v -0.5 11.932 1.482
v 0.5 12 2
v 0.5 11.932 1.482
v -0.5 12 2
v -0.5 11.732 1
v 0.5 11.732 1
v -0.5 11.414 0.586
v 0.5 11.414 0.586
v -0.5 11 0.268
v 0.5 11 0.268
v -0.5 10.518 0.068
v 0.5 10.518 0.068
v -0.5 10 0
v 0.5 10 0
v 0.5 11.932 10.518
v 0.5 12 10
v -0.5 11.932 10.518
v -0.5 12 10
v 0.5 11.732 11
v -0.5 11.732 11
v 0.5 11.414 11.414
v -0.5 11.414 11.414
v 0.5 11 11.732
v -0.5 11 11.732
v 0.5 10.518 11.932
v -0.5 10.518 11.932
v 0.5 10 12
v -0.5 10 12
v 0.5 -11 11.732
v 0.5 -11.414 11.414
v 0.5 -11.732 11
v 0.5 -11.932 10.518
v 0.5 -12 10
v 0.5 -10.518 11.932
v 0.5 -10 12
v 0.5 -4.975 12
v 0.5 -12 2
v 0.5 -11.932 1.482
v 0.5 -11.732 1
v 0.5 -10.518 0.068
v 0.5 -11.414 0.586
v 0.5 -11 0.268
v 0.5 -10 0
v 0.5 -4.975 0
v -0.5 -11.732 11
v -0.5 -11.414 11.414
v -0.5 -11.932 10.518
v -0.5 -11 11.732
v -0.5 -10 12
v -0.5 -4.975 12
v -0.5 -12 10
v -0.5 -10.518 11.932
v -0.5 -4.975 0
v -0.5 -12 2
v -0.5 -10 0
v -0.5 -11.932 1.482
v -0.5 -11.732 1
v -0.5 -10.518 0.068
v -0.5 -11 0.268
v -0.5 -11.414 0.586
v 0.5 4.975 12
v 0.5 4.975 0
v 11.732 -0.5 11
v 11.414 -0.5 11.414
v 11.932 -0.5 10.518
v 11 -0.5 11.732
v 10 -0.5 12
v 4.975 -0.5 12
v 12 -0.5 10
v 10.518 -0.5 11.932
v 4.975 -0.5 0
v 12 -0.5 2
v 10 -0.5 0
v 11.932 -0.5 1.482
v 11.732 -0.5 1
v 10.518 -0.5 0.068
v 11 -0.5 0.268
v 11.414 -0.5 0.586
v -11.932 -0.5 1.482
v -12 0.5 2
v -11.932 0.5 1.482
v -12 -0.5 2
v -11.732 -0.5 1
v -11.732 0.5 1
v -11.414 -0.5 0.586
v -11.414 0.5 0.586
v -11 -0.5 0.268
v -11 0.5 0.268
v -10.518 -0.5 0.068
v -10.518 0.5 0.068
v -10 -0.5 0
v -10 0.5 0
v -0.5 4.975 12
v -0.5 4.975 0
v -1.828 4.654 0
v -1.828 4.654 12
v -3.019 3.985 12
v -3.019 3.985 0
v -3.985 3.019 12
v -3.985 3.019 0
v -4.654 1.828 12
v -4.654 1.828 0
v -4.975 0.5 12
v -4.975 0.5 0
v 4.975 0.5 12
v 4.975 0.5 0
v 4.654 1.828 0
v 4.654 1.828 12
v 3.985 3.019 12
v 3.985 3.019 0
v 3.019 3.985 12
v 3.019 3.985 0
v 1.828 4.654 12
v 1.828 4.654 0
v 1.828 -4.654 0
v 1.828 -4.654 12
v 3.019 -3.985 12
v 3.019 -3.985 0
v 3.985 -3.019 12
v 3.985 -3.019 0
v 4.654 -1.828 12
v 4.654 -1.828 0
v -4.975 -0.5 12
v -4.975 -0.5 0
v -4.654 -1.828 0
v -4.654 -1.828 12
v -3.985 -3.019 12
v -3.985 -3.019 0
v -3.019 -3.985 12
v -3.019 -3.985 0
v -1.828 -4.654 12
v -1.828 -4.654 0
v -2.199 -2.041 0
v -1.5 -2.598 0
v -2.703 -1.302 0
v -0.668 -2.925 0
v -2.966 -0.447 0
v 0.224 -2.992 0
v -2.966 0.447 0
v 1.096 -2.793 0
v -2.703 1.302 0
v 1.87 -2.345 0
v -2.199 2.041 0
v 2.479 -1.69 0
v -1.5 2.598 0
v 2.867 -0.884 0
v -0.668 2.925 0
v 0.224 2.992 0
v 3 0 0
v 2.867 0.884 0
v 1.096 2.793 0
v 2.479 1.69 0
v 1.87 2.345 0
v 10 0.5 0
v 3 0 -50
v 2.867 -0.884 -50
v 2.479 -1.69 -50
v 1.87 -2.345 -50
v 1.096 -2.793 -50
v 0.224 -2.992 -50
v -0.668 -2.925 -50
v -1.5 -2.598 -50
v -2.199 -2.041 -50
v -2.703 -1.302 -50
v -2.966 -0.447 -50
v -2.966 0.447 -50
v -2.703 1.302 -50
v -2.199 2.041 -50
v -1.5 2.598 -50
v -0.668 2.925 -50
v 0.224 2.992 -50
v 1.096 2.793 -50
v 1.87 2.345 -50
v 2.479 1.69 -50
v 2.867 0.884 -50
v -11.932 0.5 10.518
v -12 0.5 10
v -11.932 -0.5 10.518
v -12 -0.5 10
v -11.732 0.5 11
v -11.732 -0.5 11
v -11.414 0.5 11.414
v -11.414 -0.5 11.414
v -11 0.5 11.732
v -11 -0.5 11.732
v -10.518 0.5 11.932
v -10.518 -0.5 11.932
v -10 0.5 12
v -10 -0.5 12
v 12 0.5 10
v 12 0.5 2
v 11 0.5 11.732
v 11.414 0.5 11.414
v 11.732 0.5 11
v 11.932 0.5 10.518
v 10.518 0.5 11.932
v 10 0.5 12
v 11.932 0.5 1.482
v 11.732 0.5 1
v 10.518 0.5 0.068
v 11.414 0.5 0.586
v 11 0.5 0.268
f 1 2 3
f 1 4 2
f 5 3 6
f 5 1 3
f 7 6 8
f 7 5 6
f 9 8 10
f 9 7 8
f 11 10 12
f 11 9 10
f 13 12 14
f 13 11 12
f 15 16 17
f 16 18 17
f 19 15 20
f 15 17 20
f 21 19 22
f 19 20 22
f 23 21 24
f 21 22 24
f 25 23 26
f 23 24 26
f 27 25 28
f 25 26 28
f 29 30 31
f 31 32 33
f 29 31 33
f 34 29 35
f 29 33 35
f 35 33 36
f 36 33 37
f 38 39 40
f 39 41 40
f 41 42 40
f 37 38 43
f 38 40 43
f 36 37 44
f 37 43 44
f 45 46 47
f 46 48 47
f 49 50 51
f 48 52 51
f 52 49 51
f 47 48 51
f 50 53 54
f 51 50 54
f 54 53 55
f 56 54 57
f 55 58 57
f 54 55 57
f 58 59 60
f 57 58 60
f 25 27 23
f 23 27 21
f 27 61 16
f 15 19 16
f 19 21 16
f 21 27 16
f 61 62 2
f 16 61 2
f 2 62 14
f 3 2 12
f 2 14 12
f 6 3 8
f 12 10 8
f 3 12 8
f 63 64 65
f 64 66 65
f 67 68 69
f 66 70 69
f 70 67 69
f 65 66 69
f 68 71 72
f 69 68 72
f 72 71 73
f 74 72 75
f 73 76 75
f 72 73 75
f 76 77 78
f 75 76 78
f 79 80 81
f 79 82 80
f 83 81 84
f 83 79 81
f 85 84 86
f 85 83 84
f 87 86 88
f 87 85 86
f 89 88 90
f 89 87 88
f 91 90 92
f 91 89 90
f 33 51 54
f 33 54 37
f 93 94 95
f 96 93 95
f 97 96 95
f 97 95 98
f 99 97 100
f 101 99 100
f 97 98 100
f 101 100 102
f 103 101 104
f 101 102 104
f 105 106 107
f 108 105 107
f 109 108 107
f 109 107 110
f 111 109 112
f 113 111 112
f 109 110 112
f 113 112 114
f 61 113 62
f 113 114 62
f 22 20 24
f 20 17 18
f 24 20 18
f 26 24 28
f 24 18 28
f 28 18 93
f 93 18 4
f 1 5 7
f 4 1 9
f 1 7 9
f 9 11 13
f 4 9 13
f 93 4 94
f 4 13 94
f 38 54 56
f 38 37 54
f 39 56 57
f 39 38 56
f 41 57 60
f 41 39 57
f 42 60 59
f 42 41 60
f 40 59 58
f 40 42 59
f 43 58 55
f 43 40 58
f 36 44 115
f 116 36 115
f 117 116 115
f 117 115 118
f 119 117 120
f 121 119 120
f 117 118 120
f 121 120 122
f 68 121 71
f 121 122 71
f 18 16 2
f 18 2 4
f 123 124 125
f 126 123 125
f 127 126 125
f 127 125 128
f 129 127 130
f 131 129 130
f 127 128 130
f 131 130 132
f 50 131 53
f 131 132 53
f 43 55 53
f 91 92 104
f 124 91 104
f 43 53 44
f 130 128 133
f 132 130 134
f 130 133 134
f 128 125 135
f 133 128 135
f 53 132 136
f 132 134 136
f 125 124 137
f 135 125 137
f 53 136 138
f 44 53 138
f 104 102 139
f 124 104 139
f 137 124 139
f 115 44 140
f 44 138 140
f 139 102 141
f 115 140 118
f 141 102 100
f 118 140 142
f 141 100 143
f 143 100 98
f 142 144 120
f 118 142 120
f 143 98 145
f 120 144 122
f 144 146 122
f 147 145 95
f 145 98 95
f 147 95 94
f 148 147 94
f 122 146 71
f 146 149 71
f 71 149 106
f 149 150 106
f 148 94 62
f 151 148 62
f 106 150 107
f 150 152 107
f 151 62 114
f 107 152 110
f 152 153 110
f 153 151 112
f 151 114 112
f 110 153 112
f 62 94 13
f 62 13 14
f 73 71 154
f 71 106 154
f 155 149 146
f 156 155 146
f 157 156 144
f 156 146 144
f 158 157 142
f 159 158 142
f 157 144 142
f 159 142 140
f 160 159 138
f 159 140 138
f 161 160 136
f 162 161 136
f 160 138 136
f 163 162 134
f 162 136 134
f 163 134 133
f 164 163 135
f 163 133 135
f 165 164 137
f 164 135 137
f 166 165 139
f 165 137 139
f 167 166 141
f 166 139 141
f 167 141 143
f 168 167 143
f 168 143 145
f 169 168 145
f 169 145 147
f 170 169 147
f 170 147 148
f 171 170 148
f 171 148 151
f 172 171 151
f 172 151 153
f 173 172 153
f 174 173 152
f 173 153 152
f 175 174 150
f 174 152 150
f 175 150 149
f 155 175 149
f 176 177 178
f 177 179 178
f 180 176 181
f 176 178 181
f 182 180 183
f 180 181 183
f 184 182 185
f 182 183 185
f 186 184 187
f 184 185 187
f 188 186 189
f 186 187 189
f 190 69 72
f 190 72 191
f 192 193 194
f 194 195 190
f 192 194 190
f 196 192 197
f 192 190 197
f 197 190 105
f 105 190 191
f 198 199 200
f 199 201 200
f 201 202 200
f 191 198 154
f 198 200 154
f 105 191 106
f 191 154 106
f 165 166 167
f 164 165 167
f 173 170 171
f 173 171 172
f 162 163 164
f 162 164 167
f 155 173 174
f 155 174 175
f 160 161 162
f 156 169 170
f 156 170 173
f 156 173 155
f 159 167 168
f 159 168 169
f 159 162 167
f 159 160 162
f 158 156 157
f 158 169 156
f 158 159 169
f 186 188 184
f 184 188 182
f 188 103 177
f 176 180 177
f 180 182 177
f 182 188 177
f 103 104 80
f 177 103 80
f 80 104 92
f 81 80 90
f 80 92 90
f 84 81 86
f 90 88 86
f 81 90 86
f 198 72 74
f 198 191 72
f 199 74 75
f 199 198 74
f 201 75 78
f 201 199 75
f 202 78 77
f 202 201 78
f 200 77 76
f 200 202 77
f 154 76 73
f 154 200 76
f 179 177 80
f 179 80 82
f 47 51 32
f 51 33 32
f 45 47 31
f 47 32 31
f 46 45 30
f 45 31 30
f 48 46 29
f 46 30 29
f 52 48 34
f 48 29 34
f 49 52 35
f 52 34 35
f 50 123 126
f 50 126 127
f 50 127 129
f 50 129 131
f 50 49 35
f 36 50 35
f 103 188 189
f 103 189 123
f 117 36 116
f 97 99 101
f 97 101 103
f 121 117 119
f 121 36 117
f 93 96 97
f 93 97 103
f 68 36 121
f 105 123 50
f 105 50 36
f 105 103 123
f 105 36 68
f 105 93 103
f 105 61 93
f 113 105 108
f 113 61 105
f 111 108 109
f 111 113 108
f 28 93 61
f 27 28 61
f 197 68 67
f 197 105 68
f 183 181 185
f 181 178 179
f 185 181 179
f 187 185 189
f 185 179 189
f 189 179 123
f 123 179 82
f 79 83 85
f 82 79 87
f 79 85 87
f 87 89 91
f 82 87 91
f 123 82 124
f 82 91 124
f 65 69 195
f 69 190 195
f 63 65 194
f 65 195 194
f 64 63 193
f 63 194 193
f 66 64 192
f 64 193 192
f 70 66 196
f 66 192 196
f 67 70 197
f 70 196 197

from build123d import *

# Parameters (mm, degrees)
F1_DEPTH = 12
F2_R     = 2
F3_R     = 3
F4_DEPTH = 50


with BuildPart() as f1:
    # F0 (on Top) → F1 (new body)
    with BuildSketch(Plane.XY):
        with BuildLine():
            Line((-0.5, 12), (-0.5, 4.974937))
            ThreePointArc((-0.5, 4.974937), (-3.535534, 3.535534), (-4.974937, 0.5))
            Line((-4.974937, 0.5), (-12, 0.5))
            Line((-12, 0.5), (-12, -0.5))
            Line((-12, -0.5), (-4.974937, -0.5))
            ThreePointArc((-4.974937, -0.5), (-3.535534, -3.535534), (-0.5, -4.974937))
            Line((-0.5, -4.974937), (-0.5, -12))
            Line((-0.5, -12), (0.5, -12))
            Line((0.5, -12), (0.5, -4.974937))
            ThreePointArc((0.5, -4.974937), (3.535534, -3.535534), (4.974937, -0.5))
            Line((4.974937, -0.5), (12, -0.5))
            Line((12, -0.5), (12, 0.5))
            Line((12, 0.5), (4.974937, 0.5))
            ThreePointArc((4.974937, 0.5), (3.535534, 3.535534), (0.5, 4.974937))
            Line((0.5, 4.974937), (0.5, 12))
            Line((0.5, 12), (-0.5, 12))
        make_face()
    extrude(amount=F1_DEPTH)

    # F2
    f2_edges = [f1.edges().sort_by_distance(p)[0] for p in [
        (-12, 0, 12),
        (-12, 0, 0),
        (0, 12, 12),
        (12, 0, 12),
        (0, -12, 12),
        (0, 12, 0),
        (12, 0, 0),
        (0, -12, 0),
    ]]
    fillet(f2_edges, radius=F2_R)

    # F3 (on face) → F4 (join)
    with BuildSketch(Plane(origin=(0, 0, 0), x_dir=(1, 0, 0), z_dir=(0, 0, -1))):
        Circle(F3_R)
    extrude(amount=F4_DEPTH)


solid = f1.part
